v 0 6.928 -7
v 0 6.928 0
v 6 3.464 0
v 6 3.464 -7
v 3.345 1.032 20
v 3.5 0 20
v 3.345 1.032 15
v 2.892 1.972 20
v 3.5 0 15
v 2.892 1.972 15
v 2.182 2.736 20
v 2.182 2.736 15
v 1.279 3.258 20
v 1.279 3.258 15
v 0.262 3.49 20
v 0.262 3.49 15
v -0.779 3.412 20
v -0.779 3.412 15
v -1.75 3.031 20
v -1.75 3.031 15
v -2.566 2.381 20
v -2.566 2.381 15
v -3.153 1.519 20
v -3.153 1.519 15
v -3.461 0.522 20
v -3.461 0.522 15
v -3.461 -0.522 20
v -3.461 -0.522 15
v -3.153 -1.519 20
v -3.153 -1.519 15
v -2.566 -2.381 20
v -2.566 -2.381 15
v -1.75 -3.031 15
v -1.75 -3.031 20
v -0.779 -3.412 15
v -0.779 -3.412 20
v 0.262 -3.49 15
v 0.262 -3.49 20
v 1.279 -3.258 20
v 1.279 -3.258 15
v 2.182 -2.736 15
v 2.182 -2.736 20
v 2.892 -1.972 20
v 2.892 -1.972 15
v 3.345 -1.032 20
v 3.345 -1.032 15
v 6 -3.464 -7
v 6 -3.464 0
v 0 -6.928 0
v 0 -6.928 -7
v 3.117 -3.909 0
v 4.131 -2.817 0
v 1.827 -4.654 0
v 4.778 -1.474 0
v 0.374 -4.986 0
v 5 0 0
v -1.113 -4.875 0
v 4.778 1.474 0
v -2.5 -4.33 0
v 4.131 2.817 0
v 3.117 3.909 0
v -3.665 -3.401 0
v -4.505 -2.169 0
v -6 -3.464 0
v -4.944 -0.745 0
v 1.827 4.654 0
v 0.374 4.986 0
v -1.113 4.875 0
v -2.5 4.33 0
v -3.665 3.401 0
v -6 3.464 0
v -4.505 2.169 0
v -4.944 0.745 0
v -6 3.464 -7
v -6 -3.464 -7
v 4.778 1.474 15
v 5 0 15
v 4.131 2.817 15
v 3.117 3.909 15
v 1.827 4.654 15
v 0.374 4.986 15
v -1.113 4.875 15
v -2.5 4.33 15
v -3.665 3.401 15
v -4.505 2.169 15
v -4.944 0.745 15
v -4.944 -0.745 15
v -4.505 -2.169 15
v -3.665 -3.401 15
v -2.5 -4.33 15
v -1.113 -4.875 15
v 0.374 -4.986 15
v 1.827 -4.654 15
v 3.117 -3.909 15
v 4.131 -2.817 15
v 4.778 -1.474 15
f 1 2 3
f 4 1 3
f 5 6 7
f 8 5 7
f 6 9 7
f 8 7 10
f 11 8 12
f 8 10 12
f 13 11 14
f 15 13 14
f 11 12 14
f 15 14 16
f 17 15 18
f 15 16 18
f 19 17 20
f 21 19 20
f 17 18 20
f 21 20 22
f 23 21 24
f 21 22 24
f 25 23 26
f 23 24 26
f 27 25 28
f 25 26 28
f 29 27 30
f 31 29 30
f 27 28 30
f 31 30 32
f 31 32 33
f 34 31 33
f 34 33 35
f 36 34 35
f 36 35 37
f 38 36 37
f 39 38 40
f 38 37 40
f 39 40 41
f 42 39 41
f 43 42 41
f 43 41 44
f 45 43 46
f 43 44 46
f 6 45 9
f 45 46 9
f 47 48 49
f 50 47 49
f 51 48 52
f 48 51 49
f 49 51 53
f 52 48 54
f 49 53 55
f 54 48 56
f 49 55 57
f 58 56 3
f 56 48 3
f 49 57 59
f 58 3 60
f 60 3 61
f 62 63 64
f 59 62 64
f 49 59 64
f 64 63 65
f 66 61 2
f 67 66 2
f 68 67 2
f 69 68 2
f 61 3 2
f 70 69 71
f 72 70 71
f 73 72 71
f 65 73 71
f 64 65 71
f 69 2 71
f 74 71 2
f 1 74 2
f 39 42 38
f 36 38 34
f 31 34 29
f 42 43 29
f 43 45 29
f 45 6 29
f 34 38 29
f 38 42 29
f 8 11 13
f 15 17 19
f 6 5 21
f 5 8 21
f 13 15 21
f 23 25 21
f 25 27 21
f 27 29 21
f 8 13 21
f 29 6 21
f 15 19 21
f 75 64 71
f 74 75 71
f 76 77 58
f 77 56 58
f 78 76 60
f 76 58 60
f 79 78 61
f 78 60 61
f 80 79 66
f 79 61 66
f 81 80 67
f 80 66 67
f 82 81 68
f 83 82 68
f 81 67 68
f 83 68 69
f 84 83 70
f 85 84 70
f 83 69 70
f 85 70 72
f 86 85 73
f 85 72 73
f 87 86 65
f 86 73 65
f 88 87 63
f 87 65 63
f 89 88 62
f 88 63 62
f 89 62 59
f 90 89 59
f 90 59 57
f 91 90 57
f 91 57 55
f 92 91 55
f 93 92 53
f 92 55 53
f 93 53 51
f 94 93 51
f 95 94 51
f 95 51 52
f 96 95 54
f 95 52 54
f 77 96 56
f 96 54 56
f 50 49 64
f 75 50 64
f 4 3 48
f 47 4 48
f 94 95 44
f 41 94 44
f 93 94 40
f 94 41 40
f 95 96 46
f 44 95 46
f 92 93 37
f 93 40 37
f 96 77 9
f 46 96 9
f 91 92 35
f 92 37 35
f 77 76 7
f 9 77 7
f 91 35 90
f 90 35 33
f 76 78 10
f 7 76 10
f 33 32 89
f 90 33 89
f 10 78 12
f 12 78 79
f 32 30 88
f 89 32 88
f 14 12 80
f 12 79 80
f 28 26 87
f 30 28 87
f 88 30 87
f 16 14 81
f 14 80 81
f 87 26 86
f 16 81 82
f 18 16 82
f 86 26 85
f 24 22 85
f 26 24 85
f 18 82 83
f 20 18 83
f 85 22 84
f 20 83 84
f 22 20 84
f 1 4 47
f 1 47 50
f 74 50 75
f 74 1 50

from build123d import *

# Parameters (mm, degrees)
BOSS_EXTRUDE1_DEPTH = 7


with BuildPart() as part:
    # Sketch1 → Base-Revolve (revolve)
    with BuildSketch(Plane(origin=(0, 0, 0), x_dir=(1, 0, 0), z_dir=(0, 1, 0))):
        Polygon((0, 0), (0, -20), (3.5, -20), (3.5, -15), (5, -15), (5, 0), align=None)
    revolve(axis=Axis((0, 0, -1.187299328), (0, 0, 1)))

    # Sketch2 → Boss-Extrude1 (add)
    with BuildSketch(Plane(origin=(0, 0, 0), x_dir=(-1, 0, 0), z_dir=(0, 0, -1))):
        Polygon((6, -3.464101615), (6, 3.464101615), (0, 6.92820323), (-6, 3.464101615), (-6, -3.464101615), (0, -6.92820323), align=None)
    extrude(amount=BOSS_EXTRUDE1_DEPTH)


solid = part.part
